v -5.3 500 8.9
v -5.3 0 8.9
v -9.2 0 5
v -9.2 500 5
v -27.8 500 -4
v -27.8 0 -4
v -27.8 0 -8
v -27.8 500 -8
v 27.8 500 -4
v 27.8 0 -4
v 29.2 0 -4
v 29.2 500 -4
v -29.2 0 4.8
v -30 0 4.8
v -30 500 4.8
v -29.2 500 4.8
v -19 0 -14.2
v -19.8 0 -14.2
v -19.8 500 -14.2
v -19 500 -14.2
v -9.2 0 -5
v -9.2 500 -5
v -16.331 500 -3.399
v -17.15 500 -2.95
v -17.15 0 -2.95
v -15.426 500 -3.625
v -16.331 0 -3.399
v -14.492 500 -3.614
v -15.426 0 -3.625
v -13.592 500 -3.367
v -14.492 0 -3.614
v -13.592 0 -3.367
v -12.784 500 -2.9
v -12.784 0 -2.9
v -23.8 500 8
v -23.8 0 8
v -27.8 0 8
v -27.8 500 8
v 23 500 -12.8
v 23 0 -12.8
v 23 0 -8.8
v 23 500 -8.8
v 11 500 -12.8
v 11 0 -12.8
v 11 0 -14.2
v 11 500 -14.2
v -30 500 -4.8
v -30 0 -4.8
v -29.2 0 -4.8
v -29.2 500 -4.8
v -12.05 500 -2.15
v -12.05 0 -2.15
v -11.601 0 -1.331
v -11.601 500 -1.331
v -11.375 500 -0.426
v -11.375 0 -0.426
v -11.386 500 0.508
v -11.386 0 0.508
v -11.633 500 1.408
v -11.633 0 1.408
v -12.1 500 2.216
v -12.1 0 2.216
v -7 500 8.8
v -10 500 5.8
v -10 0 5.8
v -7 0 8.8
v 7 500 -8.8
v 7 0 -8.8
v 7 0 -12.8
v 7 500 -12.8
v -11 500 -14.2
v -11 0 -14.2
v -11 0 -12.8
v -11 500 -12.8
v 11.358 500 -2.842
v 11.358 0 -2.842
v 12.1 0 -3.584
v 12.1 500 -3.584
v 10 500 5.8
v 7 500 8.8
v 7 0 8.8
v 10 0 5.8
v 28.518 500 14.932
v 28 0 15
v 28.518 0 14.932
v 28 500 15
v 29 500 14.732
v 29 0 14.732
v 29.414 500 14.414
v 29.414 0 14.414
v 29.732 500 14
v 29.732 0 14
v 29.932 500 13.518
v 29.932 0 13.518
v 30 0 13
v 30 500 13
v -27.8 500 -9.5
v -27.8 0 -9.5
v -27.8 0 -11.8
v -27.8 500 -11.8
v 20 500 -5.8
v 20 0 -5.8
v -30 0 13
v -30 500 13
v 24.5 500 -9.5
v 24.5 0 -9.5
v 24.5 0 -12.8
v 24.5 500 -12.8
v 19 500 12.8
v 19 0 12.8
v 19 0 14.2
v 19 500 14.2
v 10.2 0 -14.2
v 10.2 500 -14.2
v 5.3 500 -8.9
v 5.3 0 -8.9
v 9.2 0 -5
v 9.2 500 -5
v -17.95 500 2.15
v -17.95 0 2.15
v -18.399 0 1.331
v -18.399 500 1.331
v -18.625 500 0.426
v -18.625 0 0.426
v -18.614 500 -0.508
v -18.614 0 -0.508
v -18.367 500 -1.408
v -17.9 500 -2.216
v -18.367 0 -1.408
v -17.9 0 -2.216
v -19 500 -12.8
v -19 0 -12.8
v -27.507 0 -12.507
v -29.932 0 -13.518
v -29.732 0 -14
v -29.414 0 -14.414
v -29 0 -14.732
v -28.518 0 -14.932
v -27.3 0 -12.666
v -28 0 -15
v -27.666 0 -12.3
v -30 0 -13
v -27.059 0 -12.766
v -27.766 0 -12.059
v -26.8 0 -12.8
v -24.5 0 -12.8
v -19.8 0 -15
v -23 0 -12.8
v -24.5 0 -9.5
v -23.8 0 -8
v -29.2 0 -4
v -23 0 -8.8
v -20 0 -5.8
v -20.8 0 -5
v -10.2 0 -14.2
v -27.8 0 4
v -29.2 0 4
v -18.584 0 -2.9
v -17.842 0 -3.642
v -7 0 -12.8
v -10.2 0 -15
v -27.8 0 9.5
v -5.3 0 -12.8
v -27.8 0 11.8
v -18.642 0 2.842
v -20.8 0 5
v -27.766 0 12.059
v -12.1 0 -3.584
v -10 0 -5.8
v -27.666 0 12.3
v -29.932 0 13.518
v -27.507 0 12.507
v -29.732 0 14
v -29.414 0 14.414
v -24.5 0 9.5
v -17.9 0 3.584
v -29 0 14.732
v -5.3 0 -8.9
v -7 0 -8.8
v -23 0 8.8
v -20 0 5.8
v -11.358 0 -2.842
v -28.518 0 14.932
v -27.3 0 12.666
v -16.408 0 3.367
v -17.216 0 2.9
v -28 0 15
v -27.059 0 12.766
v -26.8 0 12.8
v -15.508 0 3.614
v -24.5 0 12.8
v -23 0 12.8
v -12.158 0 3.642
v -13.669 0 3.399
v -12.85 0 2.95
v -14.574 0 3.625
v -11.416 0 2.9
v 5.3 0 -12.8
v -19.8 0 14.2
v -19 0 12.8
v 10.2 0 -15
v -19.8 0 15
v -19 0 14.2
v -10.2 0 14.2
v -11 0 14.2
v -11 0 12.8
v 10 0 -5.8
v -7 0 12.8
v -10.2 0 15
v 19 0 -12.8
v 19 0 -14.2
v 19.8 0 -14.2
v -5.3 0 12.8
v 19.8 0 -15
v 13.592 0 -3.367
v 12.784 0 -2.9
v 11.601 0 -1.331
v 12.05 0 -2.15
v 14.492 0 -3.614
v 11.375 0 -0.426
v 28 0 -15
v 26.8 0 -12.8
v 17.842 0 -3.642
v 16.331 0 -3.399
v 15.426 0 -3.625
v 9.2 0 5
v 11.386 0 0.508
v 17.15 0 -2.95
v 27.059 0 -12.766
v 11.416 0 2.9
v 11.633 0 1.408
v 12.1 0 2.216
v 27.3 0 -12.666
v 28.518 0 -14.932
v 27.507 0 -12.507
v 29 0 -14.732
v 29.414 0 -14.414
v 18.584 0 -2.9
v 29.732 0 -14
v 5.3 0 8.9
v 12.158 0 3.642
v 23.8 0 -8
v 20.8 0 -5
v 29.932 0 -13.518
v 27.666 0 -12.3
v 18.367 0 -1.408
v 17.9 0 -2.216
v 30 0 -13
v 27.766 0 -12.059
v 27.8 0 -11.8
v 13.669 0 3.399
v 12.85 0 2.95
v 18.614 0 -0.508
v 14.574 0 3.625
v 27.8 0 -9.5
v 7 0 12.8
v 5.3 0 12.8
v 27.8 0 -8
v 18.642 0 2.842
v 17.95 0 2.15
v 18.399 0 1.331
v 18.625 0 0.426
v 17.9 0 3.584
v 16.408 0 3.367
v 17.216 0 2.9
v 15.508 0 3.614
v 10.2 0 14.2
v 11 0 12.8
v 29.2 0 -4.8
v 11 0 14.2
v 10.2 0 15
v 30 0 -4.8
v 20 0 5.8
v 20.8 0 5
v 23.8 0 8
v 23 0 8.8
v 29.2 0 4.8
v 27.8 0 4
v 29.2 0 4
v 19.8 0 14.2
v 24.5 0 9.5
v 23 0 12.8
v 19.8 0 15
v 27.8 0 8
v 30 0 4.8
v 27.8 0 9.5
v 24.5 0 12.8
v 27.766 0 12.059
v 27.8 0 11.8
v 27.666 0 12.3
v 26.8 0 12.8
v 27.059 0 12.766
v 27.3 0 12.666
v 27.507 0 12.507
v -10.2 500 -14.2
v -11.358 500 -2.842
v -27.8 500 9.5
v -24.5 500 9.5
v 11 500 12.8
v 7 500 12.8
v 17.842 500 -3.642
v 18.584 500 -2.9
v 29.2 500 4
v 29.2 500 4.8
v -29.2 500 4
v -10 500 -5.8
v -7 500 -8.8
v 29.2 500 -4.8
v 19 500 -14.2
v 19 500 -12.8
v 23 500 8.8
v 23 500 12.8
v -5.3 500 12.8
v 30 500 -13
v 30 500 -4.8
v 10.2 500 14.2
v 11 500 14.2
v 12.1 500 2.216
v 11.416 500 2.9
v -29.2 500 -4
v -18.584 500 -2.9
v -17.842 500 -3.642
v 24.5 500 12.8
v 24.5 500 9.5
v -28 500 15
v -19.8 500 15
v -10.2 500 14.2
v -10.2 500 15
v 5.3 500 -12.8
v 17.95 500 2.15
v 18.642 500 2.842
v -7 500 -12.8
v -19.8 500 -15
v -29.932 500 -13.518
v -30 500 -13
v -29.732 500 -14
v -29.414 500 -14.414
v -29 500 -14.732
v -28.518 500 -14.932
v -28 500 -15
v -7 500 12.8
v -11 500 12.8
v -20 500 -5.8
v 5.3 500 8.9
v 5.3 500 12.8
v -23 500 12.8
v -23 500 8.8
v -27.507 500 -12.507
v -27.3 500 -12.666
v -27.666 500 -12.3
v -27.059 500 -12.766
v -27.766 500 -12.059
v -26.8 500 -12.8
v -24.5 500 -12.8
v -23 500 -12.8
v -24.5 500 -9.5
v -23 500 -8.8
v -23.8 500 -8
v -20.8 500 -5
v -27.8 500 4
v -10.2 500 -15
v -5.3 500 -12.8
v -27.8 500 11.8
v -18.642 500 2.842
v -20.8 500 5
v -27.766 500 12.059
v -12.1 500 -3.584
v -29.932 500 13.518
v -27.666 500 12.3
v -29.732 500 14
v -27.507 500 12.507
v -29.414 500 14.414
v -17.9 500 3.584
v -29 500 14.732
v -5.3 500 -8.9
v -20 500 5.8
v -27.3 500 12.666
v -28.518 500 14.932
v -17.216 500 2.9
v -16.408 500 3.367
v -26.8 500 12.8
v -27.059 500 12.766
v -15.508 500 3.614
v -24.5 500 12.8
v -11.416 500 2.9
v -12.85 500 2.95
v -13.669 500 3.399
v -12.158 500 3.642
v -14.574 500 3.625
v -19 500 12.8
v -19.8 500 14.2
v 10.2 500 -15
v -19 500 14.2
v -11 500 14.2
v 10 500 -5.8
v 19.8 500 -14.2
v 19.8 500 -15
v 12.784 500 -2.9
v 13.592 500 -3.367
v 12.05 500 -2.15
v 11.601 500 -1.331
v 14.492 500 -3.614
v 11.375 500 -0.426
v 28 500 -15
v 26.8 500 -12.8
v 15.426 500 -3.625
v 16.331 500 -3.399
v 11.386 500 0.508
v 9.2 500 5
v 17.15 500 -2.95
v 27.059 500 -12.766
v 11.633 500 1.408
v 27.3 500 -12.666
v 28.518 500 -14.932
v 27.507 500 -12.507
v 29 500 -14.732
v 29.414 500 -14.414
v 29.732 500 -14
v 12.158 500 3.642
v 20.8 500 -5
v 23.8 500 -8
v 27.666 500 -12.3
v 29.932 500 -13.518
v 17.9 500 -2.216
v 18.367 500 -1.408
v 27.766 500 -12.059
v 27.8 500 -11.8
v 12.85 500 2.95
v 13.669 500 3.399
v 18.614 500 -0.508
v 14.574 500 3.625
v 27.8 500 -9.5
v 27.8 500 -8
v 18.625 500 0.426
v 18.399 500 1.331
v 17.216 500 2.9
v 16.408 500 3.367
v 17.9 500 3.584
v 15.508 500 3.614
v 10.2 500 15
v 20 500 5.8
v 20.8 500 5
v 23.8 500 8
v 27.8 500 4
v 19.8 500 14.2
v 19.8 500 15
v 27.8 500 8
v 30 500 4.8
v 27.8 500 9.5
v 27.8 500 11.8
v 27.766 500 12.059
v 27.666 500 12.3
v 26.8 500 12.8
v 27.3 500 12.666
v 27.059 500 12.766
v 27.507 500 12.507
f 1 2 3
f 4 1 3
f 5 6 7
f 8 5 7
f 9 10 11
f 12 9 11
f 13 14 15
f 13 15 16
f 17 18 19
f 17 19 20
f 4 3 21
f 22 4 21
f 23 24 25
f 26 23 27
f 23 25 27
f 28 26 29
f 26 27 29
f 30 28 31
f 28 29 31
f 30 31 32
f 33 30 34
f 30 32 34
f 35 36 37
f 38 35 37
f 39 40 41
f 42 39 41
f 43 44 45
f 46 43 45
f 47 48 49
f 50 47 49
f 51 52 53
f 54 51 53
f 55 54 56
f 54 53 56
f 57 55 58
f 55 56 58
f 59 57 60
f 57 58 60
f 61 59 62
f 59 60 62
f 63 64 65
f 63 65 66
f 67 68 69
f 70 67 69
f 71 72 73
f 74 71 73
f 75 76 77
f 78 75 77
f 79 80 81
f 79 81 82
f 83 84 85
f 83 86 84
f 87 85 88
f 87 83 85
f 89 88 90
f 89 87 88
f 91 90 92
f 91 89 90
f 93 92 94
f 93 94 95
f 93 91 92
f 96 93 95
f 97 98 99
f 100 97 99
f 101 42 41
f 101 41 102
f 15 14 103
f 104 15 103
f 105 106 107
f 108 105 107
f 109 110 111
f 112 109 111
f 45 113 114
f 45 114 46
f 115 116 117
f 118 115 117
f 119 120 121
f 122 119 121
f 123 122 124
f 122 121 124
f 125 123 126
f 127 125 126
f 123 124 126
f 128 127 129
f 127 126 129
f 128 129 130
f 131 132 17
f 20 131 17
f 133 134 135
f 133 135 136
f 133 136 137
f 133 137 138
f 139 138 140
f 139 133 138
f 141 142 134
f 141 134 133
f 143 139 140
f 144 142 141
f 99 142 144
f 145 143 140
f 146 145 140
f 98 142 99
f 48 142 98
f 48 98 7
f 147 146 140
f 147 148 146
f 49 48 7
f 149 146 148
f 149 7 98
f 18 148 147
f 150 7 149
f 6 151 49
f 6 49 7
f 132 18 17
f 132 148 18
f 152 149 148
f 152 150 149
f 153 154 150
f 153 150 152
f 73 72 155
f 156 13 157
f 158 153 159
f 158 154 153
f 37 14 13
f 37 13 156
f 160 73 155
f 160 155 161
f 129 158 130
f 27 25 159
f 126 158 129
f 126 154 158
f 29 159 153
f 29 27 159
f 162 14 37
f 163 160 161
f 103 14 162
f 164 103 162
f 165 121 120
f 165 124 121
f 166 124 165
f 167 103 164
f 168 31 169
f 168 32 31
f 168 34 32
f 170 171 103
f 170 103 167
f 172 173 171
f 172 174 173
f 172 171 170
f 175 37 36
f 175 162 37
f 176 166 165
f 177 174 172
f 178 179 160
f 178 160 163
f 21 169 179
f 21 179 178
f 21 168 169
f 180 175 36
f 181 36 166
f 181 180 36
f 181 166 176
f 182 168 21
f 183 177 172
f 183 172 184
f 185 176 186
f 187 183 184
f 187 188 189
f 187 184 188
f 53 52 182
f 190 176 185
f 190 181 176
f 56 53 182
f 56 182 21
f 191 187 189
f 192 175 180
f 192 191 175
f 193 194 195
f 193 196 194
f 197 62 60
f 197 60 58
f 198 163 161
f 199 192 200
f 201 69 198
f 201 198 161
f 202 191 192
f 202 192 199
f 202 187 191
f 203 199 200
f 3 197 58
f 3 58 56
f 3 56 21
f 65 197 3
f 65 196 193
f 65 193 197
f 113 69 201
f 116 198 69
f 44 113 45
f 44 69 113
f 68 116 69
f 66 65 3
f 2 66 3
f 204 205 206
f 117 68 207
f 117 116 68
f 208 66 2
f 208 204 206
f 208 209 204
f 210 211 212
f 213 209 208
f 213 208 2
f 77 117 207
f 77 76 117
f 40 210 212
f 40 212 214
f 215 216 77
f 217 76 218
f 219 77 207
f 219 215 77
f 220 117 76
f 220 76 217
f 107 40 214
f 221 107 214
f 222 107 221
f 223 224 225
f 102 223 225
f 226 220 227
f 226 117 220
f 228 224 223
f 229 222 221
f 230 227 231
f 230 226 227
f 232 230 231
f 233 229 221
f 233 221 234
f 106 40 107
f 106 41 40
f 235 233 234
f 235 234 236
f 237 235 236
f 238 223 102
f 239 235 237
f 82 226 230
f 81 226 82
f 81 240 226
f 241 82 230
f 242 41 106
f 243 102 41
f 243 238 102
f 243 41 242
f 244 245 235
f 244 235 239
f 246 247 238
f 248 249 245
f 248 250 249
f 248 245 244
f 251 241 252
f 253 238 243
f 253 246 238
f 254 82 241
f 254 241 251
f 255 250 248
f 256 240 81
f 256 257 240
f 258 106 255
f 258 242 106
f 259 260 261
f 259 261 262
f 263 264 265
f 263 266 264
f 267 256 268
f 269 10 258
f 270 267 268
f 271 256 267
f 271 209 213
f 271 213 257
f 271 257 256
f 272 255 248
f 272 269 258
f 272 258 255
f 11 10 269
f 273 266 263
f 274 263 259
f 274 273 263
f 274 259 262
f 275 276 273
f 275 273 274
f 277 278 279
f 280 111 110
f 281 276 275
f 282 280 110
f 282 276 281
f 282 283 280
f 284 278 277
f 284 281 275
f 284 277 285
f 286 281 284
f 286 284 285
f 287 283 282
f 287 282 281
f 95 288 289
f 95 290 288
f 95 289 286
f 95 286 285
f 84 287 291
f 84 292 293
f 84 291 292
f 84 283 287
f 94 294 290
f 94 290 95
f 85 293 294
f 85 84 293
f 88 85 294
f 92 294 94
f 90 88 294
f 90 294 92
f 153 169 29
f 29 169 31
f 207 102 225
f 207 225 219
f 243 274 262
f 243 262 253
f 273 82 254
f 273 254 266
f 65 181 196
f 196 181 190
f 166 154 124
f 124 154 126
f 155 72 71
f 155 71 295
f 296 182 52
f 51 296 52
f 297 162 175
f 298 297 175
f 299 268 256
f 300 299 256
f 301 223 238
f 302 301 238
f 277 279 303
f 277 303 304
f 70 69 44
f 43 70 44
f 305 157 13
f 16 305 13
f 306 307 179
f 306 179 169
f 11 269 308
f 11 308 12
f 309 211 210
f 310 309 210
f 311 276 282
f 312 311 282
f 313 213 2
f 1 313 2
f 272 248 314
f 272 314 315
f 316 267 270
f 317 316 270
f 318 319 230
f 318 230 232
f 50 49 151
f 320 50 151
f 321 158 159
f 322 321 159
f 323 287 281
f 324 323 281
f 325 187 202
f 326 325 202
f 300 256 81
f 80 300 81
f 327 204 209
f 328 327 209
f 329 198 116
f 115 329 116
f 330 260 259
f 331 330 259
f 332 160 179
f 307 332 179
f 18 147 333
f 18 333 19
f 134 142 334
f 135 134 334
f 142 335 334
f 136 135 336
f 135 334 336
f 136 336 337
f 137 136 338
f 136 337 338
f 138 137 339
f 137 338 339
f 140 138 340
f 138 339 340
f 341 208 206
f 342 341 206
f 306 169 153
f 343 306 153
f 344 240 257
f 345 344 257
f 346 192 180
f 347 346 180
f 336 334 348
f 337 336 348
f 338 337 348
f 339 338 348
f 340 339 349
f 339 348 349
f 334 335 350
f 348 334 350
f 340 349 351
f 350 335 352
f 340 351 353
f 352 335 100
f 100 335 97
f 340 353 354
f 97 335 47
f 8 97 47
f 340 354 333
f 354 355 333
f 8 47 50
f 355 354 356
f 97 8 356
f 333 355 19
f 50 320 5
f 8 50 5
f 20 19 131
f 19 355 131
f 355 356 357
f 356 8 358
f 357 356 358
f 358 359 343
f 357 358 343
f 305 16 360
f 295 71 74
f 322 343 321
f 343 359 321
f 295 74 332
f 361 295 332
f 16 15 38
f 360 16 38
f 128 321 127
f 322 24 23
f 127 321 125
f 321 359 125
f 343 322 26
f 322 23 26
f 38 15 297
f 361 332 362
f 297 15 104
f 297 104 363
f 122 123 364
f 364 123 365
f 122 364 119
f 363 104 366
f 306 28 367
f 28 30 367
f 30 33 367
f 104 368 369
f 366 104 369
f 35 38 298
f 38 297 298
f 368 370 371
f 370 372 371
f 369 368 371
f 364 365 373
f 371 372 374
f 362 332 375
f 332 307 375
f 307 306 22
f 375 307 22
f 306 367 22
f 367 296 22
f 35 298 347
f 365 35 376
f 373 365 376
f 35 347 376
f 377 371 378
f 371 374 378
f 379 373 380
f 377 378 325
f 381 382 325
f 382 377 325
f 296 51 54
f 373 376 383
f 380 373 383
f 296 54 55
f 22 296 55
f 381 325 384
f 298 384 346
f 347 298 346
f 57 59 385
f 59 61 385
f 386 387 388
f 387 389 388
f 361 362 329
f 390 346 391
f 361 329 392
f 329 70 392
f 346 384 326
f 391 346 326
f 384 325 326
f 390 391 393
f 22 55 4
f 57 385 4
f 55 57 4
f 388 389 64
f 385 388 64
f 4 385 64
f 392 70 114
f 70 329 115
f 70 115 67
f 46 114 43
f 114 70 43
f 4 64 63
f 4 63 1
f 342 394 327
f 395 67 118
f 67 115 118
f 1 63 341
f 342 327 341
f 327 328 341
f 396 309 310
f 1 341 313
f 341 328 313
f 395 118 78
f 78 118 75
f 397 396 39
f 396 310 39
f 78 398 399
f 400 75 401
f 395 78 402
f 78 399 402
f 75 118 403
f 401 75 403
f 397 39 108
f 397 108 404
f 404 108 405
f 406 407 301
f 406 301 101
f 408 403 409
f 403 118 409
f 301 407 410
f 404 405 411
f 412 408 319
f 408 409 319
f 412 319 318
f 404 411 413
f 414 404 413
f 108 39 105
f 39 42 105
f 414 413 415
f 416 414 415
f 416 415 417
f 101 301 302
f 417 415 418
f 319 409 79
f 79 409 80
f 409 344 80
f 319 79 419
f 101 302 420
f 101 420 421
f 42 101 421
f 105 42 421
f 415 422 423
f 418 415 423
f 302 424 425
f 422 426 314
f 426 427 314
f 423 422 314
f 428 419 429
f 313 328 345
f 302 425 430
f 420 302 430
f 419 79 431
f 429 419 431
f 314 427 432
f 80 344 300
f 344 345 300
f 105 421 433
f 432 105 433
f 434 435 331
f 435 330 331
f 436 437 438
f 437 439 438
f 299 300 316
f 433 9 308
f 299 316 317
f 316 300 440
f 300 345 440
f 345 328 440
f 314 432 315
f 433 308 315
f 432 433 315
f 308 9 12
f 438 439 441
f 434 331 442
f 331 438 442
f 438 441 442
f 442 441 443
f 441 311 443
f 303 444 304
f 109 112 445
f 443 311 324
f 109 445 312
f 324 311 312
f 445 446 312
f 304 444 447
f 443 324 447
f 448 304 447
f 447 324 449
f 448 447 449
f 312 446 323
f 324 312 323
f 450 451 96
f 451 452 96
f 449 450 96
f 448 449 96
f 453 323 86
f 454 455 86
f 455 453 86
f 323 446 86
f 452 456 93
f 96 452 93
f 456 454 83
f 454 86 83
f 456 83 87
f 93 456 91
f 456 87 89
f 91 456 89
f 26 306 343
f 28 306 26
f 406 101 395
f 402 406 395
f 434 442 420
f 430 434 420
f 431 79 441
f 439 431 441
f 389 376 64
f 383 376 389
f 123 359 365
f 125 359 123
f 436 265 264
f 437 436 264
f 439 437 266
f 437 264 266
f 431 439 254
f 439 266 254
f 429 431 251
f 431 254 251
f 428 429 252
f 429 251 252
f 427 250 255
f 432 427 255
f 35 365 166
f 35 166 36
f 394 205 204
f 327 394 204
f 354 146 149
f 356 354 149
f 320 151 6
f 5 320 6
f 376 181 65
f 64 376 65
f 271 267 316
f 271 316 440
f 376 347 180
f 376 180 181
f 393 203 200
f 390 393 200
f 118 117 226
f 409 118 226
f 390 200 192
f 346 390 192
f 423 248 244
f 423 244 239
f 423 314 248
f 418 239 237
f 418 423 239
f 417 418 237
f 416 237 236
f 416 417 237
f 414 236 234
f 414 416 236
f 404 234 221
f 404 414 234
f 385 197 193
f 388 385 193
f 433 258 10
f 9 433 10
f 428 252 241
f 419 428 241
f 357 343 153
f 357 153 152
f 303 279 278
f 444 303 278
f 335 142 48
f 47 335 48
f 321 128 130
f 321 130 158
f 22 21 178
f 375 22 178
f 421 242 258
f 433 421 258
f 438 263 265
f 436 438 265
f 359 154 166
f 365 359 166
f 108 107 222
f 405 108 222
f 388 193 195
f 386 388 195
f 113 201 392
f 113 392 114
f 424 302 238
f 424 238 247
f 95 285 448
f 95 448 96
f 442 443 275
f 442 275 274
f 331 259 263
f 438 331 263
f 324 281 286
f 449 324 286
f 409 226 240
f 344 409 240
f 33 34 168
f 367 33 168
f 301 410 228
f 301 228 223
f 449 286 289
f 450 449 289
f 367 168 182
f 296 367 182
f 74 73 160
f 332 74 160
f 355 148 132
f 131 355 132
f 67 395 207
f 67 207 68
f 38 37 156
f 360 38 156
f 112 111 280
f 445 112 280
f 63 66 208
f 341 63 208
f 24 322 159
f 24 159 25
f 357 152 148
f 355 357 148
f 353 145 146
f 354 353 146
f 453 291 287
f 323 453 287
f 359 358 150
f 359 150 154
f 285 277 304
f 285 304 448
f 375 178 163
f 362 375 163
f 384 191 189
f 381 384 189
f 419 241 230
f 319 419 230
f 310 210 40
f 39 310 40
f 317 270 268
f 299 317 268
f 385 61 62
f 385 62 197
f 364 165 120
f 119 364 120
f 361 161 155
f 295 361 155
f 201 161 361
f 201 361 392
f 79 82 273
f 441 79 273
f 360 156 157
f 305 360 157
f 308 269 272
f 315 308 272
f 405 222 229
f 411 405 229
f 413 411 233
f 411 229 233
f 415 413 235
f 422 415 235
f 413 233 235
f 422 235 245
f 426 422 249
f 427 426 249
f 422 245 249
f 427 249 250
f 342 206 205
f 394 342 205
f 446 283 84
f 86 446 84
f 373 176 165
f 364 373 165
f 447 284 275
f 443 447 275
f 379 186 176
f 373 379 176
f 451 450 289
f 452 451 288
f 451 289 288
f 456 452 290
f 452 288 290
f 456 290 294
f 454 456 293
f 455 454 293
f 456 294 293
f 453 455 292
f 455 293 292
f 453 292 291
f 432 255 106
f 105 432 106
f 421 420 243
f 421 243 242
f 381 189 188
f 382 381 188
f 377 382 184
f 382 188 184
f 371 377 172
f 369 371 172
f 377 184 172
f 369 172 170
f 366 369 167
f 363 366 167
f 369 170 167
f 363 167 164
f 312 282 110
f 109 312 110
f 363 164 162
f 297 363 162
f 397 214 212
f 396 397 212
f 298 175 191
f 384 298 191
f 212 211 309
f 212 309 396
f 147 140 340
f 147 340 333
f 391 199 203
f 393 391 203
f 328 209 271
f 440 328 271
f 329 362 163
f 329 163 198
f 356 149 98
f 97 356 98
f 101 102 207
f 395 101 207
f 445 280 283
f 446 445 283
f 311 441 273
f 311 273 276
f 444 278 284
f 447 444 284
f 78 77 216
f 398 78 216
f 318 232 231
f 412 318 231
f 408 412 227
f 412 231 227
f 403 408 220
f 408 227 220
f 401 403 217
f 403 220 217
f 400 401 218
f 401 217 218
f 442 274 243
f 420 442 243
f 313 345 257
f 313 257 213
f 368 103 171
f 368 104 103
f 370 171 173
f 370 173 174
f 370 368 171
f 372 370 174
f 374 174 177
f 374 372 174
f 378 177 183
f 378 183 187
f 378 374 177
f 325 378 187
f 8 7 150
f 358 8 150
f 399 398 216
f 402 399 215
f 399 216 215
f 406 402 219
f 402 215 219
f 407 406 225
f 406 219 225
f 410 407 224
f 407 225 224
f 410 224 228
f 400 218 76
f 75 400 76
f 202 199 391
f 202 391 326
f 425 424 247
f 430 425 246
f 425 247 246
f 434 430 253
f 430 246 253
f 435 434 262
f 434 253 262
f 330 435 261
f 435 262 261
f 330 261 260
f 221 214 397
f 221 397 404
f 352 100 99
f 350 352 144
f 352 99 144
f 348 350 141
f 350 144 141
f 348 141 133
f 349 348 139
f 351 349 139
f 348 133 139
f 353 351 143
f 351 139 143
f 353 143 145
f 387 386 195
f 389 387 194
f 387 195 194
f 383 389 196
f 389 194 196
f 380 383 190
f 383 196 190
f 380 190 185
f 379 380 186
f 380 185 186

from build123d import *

# Parameters (mm, degrees)
F0_W      = 60
F0_H      = 30
F1_DEPTH  = 500
F2_R      = 3.65
F3_DEPTH  = 500.001
F5_DEPTH  = 500.001
F6_R      = 2
F8_DEPTH  = 500.001
F10_DEPTH = 500.001
F11_W     = 0.8
F11_H     = 0.8
F12_DEPTH = 500.001


with BuildPart() as f1:
    # F0 (on Front) → F1 (new body)
    with BuildSketch(Plane.XZ):
        Rectangle(F0_W, F0_H)
    extrude(amount=-F1_DEPTH)

    # F2 (on face) → F3 (cut, through all)
    with BuildSketch(Plane.XZ):
        with Locations((-15, 0)):
            Circle(F2_R)
        with Locations((15, 0)):
            Circle(F2_R)
    extrude(amount=-F3_DEPTH, mode=Mode.SUBTRACT)

    # F4 (on face) → F5 (cut, through all)
    with BuildSketch(Plane.XZ):
        Polygon((-11, 15), (-15, 15), (-19, 15), (-19, 12.8), (-23, 12.8), (-23, 8.8), (-20, 5.8), (-15, 5.8), (-10, 5.8), (-7, 8.8), (-7, 12.8), (-11, 12.8), align=None)
        Polygon((19, 12.8), (19, 15), (15, 15), (11, 15), (11, 12.8), (7, 12.8), (7, 8.8), (10, 5.8), (15, 5.8), (20, 5.8), (23, 8.8), (23, 12.8), align=None)
        Polygon((23.8, 8), (20.8, 5), (20.8, 0), (20.8, -5), (23.8, -8), (27.8, -8), (27.8, -4), (30, -4), (30, 0), (30, 4), (27.8, 4), (27.8, 8), align=None)
        Polygon((23, -8.8), (20, -5.8), (15, -5.8), (10, -5.8), (7, -8.8), (7, -12.8), (11, -12.8), (11, -15), (15, -15), (19, -15), (19, -12.8), (23, -12.8), align=None)
        Polygon((-20.8, 0), (-20.8, 5), (-23.8, 8), (-27.8, 8), (-27.8, 4), (-30, 4), (-30, 0), (-30, -4), (-27.8, -4), (-27.8, -8), (-23.8, -8), (-20.8, -5), align=None)
        Polygon((-23, -12.8), (-19, -12.8), (-19, -15), (-15, -15), (-11, -15), (-11, -12.8), (-7, -12.8), (-7, -8.8), (-10, -5.8), (-15, -5.8), (-20, -5.8), (-23, -8.8), align=None)
        Polygon((-5.3, 8.9), (-9.2, 5), (-9.2, 0), (-9.2, -5), (-5.3, -8.9), (-5.3, -12.8), (0, -12.8), (5.3, -12.8), (5.3, -8.9), (9.2, -5), (9.2, 0), (9.2, 5), (5.3, 8.9), (5.3, 12.8), (0, 12.8), (-5.3, 12.8), align=None)
    extrude(amount=-F5_DEPTH, mode=Mode.SUBTRACT)

    # F6
    f6_edges = [f1.edges().sort_by_distance(p)[0] for p in [
        (-30, 250, 15),
        (30, 250, 15),
        (30, 250, -15),
        (-30, 250, -15),
    ]]
    fillet(f6_edges, radius=F6_R)

    # F7 (on face) → F8 (cut, through all)
    with BuildSketch(Plane.XZ):
        with BuildLine():
            Line((-27.8, 9.5), (-24.5, 9.5))
            Line((-24.5, 9.5), (-24.5, 12.8))
            Line((-24.5, 12.8), (-26.8, 12.8))
            ThreePointArc((-26.8, 12.8), (-27.507107, 12.507107), (-27.8, 11.8))
            Line((-27.8, 11.8), (-27.8, 9.5))
        make_face()
        with BuildLine():
            Line((26.8, 12.8), (24.5, 12.8))
            Line((24.5, 12.8), (24.5, 9.5))
            Line((24.5, 9.5), (27.8, 9.5))
            Line((27.8, 9.5), (27.8, 11.8))
            ThreePointArc((27.8, 11.8), (27.507107, 12.507107), (26.8, 12.8))
        make_face()
        with BuildLine():
            Line((24.5, -12.8), (26.8, -12.8))
            ThreePointArc((26.8, -12.8), (27.507107, -12.507107), (27.8, -11.8))
            Line((27.8, -11.8), (27.8, -9.5))
            Line((27.8, -9.5), (24.5, -9.5))
            Line((24.5, -9.5), (24.5, -12.8))
        make_face()
        with BuildLine():
            Line((-24.5, -9.5), (-27.8, -9.5))
            Line((-27.8, -9.5), (-27.8, -11.8))
            ThreePointArc((-27.8, -11.8), (-27.507107, -12.507107), (-26.8, -12.8))
            Line((-26.8, -12.8), (-24.5, -12.8))
            Line((-24.5, -12.8), (-24.5, -9.5))
        make_face()
    extrude(amount=-F8_DEPTH, mode=Mode.SUBTRACT)

    # F9 (on face) → F10 (cut, through all)
    with BuildSketch(Plane.XZ):
        Polygon((-18.641792, 2.841792), (-17.949755, 2.149755), (-17.216416, 2.9), (-17.9, 3.583584), align=None)
        Polygon((-17.841792, -3.641792), (-17.149755, -2.949755), (-17.9, -2.216416), (-18.583584, -2.9), align=None)
        Polygon((-11.358208, -2.841792), (-12.050245, -2.149755), (-12.783584, -2.9), (-12.1, -3.583584), align=None)
        Polygon((-12.158208, 3.641792), (-12.850245, 2.949755), (-12.1, 2.216416), (-11.416416, 2.9), align=None)
        Polygon((11.416416, 2.9), (12.1, 2.216416), (12.850245, 2.949755), (12.158208, 3.641792), align=None)
        Polygon((17.216416, 2.9), (17.949755, 2.149755), (18.641792, 2.841792), (17.9, 3.583584), align=None)
        Polygon((17.841792, -3.641792), (18.583584, -2.9), (17.9, -2.216416), (17.149755, -2.949755), align=None)
        Polygon((12.783584, -2.9), (12.050245, -2.149755), (11.358208, -2.841792), (12.1, -3.583584), align=None)
    extrude(amount=-F10_DEPTH, mode=Mode.SUBTRACT)

    # F11 (on face) → F12 (cut, through all)
    with BuildSketch(Plane.XZ):
        with Locations((10.6, 14.6)):
            Rectangle(F11_W, F11_H)
        with Locations((19.4, 14.6)):
            Rectangle(F11_W, F11_H)
        with Locations((29.6, -4.4)):
            Rectangle(F11_W, F11_H)
        with Locations((29.6, 4.4)):
            Rectangle(F11_W, F11_H)
        with Locations((10.6, -14.6)):
            Rectangle(F11_W, F11_H)
        with Locations((19.4, -14.6)):
            Rectangle(F11_W, F11_H)
        with Locations((-10.6, 14.6)):
            Rectangle(F11_W, F11_H)
        with Locations((-19.4, 14.6)):
            Rectangle(F11_W, F11_H)
        with Locations((-29.6, 4.4)):
            Rectangle(F11_W, F11_H)
        with Locations((-29.6, -4.4)):
            Rectangle(F11_W, F11_H)
        with Locations((-19.4, -14.6)):
            Rectangle(F11_W, F11_H)
        with Locations((-10.6, -14.6)):
            Rectangle(F11_W, F11_H)
    extrude(amount=-F12_DEPTH, mode=Mode.SUBTRACT)


solid = f1.part
